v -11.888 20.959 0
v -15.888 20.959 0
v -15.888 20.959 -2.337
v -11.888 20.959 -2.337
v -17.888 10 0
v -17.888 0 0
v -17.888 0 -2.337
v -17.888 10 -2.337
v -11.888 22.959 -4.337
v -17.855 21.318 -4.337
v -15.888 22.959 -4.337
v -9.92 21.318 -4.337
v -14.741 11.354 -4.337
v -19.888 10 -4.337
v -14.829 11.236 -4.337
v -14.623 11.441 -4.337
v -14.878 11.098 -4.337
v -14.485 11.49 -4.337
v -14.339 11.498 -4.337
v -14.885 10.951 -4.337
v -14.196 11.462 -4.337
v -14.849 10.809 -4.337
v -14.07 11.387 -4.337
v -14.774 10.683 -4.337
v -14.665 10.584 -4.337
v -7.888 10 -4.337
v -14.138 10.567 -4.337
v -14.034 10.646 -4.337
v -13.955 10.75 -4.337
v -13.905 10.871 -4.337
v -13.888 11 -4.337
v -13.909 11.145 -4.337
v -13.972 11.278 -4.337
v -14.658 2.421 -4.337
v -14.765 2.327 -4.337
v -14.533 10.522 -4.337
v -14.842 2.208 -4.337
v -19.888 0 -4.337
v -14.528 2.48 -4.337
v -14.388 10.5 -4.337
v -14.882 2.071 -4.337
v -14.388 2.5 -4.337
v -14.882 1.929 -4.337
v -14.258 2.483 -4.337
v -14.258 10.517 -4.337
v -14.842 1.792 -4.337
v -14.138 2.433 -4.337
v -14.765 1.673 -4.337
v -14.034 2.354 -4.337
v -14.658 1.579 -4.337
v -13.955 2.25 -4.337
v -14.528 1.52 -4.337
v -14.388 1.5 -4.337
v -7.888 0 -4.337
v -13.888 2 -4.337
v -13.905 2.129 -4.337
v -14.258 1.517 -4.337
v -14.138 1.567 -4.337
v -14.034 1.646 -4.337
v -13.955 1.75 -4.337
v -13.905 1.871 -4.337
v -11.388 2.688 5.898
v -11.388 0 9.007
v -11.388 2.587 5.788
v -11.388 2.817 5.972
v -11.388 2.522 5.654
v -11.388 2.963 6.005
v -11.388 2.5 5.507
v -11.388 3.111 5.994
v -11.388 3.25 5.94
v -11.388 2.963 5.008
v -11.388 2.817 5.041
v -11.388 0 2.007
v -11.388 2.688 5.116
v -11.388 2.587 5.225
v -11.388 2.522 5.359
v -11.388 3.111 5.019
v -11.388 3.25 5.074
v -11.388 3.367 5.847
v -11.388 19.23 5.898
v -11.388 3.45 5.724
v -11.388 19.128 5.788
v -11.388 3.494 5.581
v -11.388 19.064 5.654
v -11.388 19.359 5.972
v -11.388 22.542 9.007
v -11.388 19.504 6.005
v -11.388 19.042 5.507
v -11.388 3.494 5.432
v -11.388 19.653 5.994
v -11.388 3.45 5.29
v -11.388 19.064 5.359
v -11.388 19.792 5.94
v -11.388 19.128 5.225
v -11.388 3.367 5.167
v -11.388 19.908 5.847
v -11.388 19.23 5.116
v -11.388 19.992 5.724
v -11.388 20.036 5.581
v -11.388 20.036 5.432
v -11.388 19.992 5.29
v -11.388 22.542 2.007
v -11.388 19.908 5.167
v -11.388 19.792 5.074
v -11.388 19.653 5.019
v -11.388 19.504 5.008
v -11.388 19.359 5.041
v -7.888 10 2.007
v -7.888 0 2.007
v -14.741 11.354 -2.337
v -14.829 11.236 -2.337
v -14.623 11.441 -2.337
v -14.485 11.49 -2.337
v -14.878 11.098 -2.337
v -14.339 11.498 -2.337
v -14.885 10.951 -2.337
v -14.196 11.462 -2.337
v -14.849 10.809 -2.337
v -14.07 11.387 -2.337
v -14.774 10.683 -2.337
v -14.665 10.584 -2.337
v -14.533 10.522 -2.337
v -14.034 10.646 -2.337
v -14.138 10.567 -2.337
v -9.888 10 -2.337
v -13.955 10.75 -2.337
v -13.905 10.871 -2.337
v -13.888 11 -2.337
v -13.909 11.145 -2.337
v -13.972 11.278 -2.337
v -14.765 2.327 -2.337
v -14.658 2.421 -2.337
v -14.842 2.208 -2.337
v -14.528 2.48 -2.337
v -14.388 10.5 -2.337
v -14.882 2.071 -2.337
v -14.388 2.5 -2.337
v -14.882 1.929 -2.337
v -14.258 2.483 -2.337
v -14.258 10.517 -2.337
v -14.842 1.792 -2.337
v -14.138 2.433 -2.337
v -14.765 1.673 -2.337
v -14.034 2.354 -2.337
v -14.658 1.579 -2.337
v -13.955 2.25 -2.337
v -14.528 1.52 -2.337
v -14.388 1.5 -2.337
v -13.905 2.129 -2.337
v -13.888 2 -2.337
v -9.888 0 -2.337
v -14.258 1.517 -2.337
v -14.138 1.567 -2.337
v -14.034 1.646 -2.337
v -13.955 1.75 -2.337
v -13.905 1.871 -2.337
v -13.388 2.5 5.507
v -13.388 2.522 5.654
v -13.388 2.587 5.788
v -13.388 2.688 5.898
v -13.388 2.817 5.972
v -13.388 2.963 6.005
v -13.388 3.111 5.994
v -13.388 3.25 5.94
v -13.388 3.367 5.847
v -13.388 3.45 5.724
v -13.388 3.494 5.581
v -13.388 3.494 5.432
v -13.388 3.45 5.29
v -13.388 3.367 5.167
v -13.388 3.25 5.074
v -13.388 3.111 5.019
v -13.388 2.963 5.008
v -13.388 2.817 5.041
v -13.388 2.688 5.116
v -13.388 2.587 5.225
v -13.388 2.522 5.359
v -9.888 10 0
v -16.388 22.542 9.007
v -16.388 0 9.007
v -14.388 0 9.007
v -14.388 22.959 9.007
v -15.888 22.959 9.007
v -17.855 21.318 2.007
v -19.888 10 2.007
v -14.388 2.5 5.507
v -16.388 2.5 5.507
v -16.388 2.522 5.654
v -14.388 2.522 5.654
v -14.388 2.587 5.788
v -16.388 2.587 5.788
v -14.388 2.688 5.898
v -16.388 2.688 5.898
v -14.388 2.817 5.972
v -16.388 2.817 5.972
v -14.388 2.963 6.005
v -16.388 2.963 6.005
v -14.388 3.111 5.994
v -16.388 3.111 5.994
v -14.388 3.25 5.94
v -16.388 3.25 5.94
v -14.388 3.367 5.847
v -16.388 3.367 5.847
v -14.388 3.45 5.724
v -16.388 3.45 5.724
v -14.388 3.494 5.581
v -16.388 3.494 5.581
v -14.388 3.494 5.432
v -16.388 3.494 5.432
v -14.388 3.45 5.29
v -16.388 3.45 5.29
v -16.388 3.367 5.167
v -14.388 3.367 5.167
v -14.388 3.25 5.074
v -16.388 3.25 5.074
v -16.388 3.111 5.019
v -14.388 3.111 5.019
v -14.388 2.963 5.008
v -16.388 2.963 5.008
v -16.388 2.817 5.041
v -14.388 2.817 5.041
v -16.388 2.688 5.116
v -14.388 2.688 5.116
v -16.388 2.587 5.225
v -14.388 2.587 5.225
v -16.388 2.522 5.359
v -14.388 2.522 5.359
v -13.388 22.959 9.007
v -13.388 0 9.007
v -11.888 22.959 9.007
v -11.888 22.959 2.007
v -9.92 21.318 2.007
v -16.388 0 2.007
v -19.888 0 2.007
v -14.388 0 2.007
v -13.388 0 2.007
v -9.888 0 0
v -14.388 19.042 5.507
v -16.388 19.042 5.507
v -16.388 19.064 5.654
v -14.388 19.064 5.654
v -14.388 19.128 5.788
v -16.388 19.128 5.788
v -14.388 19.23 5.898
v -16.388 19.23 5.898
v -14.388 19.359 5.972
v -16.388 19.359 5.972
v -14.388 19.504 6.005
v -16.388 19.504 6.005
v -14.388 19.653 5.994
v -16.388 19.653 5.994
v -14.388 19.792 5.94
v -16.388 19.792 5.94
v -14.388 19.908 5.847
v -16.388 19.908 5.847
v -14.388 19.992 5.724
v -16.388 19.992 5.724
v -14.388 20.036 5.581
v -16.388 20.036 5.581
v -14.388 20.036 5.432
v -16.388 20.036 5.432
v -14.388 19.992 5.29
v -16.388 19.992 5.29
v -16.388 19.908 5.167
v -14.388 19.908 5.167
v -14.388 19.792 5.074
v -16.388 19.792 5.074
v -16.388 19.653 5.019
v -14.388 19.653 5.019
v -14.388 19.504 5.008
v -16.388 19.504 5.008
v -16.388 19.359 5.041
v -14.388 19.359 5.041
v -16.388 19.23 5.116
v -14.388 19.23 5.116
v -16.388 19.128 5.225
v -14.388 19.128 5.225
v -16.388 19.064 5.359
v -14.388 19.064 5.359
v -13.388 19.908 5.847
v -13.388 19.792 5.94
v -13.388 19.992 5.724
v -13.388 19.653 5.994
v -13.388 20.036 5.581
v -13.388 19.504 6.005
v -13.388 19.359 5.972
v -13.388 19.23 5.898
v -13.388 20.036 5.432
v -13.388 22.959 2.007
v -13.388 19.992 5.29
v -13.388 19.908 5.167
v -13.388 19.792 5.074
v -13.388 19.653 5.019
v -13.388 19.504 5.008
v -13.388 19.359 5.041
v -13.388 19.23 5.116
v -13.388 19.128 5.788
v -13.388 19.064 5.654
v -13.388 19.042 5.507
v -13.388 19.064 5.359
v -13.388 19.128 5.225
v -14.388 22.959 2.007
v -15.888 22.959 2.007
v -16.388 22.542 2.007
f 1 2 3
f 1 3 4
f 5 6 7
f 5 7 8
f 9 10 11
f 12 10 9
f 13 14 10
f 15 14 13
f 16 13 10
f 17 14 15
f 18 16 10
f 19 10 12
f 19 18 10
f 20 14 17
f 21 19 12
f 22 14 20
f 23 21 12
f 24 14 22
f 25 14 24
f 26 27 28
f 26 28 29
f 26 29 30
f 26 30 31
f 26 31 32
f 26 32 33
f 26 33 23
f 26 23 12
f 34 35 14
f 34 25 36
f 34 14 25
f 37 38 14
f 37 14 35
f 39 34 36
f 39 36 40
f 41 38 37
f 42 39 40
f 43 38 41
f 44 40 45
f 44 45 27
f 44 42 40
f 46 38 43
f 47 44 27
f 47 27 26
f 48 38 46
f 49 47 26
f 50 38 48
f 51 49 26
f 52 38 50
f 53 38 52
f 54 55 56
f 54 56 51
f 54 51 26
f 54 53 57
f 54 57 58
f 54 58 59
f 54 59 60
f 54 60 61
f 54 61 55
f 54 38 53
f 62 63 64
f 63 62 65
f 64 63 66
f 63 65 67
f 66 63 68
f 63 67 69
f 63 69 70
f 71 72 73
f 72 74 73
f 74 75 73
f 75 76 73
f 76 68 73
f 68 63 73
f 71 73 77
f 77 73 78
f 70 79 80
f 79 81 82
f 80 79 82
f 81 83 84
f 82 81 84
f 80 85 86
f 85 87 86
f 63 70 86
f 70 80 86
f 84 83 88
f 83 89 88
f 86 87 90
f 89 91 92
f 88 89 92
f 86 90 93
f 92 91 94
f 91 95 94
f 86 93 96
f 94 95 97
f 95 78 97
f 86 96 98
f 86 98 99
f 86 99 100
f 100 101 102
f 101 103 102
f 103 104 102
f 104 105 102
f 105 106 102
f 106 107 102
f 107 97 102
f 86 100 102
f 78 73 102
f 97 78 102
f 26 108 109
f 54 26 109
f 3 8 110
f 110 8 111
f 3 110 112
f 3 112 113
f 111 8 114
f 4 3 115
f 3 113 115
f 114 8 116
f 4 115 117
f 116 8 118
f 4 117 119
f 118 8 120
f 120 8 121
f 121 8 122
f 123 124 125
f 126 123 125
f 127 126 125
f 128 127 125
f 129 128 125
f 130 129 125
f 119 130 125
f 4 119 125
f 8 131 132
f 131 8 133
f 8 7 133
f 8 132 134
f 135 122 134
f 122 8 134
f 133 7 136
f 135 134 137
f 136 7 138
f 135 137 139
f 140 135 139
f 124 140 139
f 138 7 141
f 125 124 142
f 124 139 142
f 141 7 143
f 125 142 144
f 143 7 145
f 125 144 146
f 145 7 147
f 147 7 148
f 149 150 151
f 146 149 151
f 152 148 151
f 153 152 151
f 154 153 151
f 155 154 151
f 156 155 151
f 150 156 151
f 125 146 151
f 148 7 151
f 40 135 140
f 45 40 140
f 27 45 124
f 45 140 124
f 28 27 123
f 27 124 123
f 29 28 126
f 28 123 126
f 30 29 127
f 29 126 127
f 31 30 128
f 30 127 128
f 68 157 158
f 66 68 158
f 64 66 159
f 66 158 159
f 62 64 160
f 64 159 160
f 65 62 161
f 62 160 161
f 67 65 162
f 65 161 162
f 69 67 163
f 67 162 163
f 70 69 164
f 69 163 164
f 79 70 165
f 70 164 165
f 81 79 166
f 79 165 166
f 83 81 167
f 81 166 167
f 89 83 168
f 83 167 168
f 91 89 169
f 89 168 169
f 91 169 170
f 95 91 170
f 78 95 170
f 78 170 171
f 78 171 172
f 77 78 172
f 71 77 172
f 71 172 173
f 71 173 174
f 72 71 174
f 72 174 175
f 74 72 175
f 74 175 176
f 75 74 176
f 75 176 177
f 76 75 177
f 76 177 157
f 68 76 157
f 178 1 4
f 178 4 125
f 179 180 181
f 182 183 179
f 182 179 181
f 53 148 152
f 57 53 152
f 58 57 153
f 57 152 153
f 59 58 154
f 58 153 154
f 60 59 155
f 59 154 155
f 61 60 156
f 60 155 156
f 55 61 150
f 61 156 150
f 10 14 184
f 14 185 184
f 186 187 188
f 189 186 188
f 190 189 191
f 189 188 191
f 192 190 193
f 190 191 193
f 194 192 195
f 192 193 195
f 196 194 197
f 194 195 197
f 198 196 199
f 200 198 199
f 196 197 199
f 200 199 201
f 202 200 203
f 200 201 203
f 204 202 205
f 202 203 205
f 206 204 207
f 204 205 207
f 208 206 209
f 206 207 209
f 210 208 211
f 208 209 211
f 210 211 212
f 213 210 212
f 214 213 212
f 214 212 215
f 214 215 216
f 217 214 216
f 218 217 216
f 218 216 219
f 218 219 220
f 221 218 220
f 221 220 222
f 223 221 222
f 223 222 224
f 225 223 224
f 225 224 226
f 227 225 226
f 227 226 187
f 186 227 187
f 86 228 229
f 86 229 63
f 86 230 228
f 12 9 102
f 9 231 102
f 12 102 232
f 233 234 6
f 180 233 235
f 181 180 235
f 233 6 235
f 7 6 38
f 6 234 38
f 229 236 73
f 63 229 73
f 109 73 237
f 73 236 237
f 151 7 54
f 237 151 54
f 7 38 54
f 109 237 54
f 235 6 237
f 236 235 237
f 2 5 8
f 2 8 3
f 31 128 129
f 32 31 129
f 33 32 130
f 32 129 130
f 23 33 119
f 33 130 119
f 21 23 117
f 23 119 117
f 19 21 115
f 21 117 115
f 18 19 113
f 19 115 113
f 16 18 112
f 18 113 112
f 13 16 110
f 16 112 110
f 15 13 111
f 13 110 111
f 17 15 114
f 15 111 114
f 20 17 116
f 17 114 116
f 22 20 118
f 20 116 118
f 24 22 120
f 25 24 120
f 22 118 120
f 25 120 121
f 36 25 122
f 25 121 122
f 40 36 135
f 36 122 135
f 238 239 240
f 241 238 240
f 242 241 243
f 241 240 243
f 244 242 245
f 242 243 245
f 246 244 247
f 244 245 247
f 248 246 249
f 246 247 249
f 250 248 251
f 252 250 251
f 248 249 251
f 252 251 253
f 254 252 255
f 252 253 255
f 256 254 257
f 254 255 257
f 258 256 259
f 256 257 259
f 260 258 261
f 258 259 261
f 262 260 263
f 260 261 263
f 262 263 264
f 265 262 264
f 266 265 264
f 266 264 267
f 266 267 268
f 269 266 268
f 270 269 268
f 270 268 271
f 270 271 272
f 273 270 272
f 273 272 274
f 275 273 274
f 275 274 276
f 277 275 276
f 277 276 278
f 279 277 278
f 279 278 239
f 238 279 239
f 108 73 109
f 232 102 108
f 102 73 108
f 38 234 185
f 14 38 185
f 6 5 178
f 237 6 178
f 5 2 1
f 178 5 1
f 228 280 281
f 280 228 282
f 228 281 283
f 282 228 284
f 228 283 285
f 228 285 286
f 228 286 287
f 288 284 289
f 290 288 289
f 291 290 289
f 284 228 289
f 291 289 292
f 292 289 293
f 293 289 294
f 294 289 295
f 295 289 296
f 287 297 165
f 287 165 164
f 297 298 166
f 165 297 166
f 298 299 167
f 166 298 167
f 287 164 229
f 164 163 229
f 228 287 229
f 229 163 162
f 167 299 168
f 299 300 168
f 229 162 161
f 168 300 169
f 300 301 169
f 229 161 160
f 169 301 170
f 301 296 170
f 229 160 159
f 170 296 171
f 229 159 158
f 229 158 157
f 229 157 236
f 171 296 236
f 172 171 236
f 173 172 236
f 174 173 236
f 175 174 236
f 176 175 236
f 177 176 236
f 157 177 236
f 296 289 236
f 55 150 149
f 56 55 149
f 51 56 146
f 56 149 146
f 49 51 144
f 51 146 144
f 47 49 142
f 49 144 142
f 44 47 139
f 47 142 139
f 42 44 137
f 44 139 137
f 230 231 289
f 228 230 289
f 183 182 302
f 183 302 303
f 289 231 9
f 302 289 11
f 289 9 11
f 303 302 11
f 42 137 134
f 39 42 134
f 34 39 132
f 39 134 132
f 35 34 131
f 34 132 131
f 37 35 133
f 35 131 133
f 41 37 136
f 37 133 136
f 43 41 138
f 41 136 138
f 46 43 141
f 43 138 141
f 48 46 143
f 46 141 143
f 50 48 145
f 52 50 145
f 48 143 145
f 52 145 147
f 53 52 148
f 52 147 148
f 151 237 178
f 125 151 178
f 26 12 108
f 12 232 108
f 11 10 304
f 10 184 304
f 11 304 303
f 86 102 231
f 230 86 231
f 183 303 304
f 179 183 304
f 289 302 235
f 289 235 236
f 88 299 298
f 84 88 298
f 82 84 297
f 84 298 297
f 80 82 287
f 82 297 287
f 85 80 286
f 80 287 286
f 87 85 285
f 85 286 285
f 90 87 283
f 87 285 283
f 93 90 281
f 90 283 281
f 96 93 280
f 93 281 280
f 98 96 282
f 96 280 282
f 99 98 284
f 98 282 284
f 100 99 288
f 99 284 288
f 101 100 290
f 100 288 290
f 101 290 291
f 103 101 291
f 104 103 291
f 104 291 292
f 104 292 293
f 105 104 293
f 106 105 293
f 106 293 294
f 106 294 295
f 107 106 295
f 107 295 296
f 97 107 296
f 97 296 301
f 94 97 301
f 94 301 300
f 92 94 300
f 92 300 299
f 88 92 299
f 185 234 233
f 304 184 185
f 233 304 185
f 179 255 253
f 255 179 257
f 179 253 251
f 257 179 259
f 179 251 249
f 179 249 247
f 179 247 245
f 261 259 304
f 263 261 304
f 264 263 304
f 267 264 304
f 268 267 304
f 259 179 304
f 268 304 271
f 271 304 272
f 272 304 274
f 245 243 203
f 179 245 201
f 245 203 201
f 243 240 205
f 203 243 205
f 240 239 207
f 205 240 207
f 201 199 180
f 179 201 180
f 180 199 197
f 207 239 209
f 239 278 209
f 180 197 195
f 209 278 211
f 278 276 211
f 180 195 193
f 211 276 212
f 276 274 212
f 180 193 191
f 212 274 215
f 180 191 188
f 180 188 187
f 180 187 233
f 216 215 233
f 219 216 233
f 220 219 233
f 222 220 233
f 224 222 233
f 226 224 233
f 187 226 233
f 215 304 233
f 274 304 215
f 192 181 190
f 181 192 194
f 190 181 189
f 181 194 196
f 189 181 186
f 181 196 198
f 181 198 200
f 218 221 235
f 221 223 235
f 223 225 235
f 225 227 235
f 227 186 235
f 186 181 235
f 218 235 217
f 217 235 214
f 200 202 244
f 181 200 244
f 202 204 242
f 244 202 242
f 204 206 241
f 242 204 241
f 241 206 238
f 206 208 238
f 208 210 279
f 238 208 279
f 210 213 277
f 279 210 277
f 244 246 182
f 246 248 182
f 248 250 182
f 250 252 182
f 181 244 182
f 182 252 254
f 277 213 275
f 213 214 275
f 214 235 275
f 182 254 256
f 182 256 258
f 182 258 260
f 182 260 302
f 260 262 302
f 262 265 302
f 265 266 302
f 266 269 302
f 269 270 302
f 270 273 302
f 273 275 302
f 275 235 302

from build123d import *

# Parameters (mm, degrees)
F0_W     = 2
F0_H     = 10
F1_DEPTH = 2.3368
F2_DEPTH = 2.0066
F4_DEPTH = 2
F6_DEPTH = 7
F8_D     = 1


# Not quite as in the source:
# - a feature names something its author has since deleted; it is built from what else it names


with BuildPart() as f1:
    # F0 (on Top) → F1 (new body)
    with BuildSketch(Plane.XY):
        with Locations((-18.8875418854, 5)):
            Rectangle(F0_W, F0_H)
        with Locations((-8.8875418854, 5)):
            Rectangle(F0_W, F0_H)
        Polygon((-17.8550429996, 21.3176092022), (-15.8875418854, 20.9585279226), (-15.8875418854, 22.9585279226), align=None)
        Polygon((-11.8875418854, 22.9585279226), (-11.8875418854, 20.9585279226), (-9.9200407711, 21.3176092022), align=None)
        Polygon((-11.8875418854, 20.9585279226), (-9.8875418854, 10), (-7.8875418854, 10), (-9.9200407711, 21.3176092022), align=None)
        Polygon((-15.8875418854, 20.9585279226), (-13.8875418854, 20.9585279226), (-11.8875418854, 20.9585279226), (-11.8875418854, 22.9585279226), (-15.8875418854, 22.9585279226), align=None)
        Polygon((-19.8875418854, 10), (-17.8875418854, 10), (-15.8875418854, 20.9585279226), (-17.8550429996, 21.3176092022), align=None)
    extrude(amount=-F1_DEPTH)

    # F0 (on Top) → F2 (join)
    with BuildSketch(Plane.XY):
        Polygon((-17.8875418854, 10), (-17.8875418854, 0), (-13.8875418854, 0), (-13.8875418854, 20.9585279226), (-15.8875418854, 20.9585279226), align=None)
        with Locations((-18.8875418854, 5)):
            Rectangle(F0_W, F0_H)
        Polygon((-13.8875418854, 20.9585279226), (-13.8875418854, 0), (-9.8875418854, 0), (-9.8875418854, 10), (-11.8875418854, 20.9585279226), align=None)
        Polygon((-19.8875418854, 10), (-17.8875418854, 10), (-15.8875418854, 20.9585279226), (-17.8550429996, 21.3176092022), align=None)
        with Locations((-8.8875418854, 5)):
            Rectangle(F0_W, F0_H)
        Polygon((-15.8875418854, 20.9585279226), (-13.8875418854, 20.9585279226), (-11.8875418854, 20.9585279226), (-11.8875418854, 22.9585279226), (-15.8875418854, 22.9585279226), align=None)
        Polygon((-17.8550429996, 21.3176092022), (-15.8875418854, 20.9585279226), (-15.8875418854, 22.9585279226), align=None)
        Polygon((-11.8875418854, 20.9585279226), (-9.8875418854, 10), (-7.8875418854, 10), (-9.9200407711, 21.3176092022), align=None)
        Polygon((-11.8875418854, 22.9585279226), (-11.8875418854, 20.9585279226), (-9.9200407711, 21.3176092022), align=None)
    extrude(amount=F2_DEPTH)

    # F3 (on face) → F4 (join)
    with BuildSketch(Plane(origin=(0, 0, -2.3368), x_dir=(1, 0, 0), z_dir=(0, 0, -1))):
        Polygon((-14.3875418854, 0), (-17.8875418854, 0), (-17.8875418854, -10), (-15.8875418854, -20.9585279226), (-11.8875418854, -20.9585279226), (-9.8875418854, -10), (-9.8875418854, 0), align=None)
        with BuildLine():
            ThreePointArc((-13.8875418854, -11), (-14.7410952759, -11.3535533906), (-14.3875418854, -10.5))
            ThreePointArc((-14.3875418854, -10.5), (-14.0339884948, -10.6464466094), (-13.8875418854, -11))
        make_face(mode=Mode.SUBTRACT)
        with BuildLine():
            ThreePointArc((-14.3875418854, -2.5), (-14.8875418854, -2), (-14.3875418854, -1.5))
            ThreePointArc((-14.3875418854, -1.5), (-14.0339884948, -1.6464466094), (-13.8875418854, -2))
            ThreePointArc((-13.8875418854, -2), (-14.0339884948, -2.3535533906), (-14.3875418854, -2.5))
        make_face(mode=Mode.SUBTRACT)
        Polygon((-17.8875418854, 0), (-19.8875418854, 0), (-19.8875418854, -10), (-17.8550429996, -21.3176092022), (-15.8875418854, -22.9585279226), (-11.8875418854, -22.9585279226), (-9.9200407711, -21.3176092022), (-7.8875418854, -10), (-7.8875418854, 0), (-9.8875418854, 0), (-9.8875418854, -10), (-11.8875418854, -20.9585279226), (-15.8875418854, -20.9585279226), (-17.8875418854, -10), align=None)
    extrude(amount=F4_DEPTH)

    # F5 (on face) → F6 (join)
    with BuildSketch(Plane.XY.offset(2.0066)):
        Polygon((-13.3875418854, 22.9585279226), (-13.3875418854, 0), (-11.3875418854, 0), (-11.3875418854, 22.5415221307), (-11.8875418854, 22.9585279226), align=None)
        Polygon((-16.3875418854, 0), (-14.3875418854, 0), (-14.3875418854, 22.9585279226), (-15.8875418854, 22.9585279226), (-16.3875418854, 22.5415221307), align=None)
    extrude(amount=F6_DEPTH)

    # F8 (through all)
    with Locations(Plane.YZ.offset(-11.3875418854)):
        with Locations((3, 5.5066), (19.5415221307, 5.5066)):
            Hole(F8_D / 2)


solid = f1.part
